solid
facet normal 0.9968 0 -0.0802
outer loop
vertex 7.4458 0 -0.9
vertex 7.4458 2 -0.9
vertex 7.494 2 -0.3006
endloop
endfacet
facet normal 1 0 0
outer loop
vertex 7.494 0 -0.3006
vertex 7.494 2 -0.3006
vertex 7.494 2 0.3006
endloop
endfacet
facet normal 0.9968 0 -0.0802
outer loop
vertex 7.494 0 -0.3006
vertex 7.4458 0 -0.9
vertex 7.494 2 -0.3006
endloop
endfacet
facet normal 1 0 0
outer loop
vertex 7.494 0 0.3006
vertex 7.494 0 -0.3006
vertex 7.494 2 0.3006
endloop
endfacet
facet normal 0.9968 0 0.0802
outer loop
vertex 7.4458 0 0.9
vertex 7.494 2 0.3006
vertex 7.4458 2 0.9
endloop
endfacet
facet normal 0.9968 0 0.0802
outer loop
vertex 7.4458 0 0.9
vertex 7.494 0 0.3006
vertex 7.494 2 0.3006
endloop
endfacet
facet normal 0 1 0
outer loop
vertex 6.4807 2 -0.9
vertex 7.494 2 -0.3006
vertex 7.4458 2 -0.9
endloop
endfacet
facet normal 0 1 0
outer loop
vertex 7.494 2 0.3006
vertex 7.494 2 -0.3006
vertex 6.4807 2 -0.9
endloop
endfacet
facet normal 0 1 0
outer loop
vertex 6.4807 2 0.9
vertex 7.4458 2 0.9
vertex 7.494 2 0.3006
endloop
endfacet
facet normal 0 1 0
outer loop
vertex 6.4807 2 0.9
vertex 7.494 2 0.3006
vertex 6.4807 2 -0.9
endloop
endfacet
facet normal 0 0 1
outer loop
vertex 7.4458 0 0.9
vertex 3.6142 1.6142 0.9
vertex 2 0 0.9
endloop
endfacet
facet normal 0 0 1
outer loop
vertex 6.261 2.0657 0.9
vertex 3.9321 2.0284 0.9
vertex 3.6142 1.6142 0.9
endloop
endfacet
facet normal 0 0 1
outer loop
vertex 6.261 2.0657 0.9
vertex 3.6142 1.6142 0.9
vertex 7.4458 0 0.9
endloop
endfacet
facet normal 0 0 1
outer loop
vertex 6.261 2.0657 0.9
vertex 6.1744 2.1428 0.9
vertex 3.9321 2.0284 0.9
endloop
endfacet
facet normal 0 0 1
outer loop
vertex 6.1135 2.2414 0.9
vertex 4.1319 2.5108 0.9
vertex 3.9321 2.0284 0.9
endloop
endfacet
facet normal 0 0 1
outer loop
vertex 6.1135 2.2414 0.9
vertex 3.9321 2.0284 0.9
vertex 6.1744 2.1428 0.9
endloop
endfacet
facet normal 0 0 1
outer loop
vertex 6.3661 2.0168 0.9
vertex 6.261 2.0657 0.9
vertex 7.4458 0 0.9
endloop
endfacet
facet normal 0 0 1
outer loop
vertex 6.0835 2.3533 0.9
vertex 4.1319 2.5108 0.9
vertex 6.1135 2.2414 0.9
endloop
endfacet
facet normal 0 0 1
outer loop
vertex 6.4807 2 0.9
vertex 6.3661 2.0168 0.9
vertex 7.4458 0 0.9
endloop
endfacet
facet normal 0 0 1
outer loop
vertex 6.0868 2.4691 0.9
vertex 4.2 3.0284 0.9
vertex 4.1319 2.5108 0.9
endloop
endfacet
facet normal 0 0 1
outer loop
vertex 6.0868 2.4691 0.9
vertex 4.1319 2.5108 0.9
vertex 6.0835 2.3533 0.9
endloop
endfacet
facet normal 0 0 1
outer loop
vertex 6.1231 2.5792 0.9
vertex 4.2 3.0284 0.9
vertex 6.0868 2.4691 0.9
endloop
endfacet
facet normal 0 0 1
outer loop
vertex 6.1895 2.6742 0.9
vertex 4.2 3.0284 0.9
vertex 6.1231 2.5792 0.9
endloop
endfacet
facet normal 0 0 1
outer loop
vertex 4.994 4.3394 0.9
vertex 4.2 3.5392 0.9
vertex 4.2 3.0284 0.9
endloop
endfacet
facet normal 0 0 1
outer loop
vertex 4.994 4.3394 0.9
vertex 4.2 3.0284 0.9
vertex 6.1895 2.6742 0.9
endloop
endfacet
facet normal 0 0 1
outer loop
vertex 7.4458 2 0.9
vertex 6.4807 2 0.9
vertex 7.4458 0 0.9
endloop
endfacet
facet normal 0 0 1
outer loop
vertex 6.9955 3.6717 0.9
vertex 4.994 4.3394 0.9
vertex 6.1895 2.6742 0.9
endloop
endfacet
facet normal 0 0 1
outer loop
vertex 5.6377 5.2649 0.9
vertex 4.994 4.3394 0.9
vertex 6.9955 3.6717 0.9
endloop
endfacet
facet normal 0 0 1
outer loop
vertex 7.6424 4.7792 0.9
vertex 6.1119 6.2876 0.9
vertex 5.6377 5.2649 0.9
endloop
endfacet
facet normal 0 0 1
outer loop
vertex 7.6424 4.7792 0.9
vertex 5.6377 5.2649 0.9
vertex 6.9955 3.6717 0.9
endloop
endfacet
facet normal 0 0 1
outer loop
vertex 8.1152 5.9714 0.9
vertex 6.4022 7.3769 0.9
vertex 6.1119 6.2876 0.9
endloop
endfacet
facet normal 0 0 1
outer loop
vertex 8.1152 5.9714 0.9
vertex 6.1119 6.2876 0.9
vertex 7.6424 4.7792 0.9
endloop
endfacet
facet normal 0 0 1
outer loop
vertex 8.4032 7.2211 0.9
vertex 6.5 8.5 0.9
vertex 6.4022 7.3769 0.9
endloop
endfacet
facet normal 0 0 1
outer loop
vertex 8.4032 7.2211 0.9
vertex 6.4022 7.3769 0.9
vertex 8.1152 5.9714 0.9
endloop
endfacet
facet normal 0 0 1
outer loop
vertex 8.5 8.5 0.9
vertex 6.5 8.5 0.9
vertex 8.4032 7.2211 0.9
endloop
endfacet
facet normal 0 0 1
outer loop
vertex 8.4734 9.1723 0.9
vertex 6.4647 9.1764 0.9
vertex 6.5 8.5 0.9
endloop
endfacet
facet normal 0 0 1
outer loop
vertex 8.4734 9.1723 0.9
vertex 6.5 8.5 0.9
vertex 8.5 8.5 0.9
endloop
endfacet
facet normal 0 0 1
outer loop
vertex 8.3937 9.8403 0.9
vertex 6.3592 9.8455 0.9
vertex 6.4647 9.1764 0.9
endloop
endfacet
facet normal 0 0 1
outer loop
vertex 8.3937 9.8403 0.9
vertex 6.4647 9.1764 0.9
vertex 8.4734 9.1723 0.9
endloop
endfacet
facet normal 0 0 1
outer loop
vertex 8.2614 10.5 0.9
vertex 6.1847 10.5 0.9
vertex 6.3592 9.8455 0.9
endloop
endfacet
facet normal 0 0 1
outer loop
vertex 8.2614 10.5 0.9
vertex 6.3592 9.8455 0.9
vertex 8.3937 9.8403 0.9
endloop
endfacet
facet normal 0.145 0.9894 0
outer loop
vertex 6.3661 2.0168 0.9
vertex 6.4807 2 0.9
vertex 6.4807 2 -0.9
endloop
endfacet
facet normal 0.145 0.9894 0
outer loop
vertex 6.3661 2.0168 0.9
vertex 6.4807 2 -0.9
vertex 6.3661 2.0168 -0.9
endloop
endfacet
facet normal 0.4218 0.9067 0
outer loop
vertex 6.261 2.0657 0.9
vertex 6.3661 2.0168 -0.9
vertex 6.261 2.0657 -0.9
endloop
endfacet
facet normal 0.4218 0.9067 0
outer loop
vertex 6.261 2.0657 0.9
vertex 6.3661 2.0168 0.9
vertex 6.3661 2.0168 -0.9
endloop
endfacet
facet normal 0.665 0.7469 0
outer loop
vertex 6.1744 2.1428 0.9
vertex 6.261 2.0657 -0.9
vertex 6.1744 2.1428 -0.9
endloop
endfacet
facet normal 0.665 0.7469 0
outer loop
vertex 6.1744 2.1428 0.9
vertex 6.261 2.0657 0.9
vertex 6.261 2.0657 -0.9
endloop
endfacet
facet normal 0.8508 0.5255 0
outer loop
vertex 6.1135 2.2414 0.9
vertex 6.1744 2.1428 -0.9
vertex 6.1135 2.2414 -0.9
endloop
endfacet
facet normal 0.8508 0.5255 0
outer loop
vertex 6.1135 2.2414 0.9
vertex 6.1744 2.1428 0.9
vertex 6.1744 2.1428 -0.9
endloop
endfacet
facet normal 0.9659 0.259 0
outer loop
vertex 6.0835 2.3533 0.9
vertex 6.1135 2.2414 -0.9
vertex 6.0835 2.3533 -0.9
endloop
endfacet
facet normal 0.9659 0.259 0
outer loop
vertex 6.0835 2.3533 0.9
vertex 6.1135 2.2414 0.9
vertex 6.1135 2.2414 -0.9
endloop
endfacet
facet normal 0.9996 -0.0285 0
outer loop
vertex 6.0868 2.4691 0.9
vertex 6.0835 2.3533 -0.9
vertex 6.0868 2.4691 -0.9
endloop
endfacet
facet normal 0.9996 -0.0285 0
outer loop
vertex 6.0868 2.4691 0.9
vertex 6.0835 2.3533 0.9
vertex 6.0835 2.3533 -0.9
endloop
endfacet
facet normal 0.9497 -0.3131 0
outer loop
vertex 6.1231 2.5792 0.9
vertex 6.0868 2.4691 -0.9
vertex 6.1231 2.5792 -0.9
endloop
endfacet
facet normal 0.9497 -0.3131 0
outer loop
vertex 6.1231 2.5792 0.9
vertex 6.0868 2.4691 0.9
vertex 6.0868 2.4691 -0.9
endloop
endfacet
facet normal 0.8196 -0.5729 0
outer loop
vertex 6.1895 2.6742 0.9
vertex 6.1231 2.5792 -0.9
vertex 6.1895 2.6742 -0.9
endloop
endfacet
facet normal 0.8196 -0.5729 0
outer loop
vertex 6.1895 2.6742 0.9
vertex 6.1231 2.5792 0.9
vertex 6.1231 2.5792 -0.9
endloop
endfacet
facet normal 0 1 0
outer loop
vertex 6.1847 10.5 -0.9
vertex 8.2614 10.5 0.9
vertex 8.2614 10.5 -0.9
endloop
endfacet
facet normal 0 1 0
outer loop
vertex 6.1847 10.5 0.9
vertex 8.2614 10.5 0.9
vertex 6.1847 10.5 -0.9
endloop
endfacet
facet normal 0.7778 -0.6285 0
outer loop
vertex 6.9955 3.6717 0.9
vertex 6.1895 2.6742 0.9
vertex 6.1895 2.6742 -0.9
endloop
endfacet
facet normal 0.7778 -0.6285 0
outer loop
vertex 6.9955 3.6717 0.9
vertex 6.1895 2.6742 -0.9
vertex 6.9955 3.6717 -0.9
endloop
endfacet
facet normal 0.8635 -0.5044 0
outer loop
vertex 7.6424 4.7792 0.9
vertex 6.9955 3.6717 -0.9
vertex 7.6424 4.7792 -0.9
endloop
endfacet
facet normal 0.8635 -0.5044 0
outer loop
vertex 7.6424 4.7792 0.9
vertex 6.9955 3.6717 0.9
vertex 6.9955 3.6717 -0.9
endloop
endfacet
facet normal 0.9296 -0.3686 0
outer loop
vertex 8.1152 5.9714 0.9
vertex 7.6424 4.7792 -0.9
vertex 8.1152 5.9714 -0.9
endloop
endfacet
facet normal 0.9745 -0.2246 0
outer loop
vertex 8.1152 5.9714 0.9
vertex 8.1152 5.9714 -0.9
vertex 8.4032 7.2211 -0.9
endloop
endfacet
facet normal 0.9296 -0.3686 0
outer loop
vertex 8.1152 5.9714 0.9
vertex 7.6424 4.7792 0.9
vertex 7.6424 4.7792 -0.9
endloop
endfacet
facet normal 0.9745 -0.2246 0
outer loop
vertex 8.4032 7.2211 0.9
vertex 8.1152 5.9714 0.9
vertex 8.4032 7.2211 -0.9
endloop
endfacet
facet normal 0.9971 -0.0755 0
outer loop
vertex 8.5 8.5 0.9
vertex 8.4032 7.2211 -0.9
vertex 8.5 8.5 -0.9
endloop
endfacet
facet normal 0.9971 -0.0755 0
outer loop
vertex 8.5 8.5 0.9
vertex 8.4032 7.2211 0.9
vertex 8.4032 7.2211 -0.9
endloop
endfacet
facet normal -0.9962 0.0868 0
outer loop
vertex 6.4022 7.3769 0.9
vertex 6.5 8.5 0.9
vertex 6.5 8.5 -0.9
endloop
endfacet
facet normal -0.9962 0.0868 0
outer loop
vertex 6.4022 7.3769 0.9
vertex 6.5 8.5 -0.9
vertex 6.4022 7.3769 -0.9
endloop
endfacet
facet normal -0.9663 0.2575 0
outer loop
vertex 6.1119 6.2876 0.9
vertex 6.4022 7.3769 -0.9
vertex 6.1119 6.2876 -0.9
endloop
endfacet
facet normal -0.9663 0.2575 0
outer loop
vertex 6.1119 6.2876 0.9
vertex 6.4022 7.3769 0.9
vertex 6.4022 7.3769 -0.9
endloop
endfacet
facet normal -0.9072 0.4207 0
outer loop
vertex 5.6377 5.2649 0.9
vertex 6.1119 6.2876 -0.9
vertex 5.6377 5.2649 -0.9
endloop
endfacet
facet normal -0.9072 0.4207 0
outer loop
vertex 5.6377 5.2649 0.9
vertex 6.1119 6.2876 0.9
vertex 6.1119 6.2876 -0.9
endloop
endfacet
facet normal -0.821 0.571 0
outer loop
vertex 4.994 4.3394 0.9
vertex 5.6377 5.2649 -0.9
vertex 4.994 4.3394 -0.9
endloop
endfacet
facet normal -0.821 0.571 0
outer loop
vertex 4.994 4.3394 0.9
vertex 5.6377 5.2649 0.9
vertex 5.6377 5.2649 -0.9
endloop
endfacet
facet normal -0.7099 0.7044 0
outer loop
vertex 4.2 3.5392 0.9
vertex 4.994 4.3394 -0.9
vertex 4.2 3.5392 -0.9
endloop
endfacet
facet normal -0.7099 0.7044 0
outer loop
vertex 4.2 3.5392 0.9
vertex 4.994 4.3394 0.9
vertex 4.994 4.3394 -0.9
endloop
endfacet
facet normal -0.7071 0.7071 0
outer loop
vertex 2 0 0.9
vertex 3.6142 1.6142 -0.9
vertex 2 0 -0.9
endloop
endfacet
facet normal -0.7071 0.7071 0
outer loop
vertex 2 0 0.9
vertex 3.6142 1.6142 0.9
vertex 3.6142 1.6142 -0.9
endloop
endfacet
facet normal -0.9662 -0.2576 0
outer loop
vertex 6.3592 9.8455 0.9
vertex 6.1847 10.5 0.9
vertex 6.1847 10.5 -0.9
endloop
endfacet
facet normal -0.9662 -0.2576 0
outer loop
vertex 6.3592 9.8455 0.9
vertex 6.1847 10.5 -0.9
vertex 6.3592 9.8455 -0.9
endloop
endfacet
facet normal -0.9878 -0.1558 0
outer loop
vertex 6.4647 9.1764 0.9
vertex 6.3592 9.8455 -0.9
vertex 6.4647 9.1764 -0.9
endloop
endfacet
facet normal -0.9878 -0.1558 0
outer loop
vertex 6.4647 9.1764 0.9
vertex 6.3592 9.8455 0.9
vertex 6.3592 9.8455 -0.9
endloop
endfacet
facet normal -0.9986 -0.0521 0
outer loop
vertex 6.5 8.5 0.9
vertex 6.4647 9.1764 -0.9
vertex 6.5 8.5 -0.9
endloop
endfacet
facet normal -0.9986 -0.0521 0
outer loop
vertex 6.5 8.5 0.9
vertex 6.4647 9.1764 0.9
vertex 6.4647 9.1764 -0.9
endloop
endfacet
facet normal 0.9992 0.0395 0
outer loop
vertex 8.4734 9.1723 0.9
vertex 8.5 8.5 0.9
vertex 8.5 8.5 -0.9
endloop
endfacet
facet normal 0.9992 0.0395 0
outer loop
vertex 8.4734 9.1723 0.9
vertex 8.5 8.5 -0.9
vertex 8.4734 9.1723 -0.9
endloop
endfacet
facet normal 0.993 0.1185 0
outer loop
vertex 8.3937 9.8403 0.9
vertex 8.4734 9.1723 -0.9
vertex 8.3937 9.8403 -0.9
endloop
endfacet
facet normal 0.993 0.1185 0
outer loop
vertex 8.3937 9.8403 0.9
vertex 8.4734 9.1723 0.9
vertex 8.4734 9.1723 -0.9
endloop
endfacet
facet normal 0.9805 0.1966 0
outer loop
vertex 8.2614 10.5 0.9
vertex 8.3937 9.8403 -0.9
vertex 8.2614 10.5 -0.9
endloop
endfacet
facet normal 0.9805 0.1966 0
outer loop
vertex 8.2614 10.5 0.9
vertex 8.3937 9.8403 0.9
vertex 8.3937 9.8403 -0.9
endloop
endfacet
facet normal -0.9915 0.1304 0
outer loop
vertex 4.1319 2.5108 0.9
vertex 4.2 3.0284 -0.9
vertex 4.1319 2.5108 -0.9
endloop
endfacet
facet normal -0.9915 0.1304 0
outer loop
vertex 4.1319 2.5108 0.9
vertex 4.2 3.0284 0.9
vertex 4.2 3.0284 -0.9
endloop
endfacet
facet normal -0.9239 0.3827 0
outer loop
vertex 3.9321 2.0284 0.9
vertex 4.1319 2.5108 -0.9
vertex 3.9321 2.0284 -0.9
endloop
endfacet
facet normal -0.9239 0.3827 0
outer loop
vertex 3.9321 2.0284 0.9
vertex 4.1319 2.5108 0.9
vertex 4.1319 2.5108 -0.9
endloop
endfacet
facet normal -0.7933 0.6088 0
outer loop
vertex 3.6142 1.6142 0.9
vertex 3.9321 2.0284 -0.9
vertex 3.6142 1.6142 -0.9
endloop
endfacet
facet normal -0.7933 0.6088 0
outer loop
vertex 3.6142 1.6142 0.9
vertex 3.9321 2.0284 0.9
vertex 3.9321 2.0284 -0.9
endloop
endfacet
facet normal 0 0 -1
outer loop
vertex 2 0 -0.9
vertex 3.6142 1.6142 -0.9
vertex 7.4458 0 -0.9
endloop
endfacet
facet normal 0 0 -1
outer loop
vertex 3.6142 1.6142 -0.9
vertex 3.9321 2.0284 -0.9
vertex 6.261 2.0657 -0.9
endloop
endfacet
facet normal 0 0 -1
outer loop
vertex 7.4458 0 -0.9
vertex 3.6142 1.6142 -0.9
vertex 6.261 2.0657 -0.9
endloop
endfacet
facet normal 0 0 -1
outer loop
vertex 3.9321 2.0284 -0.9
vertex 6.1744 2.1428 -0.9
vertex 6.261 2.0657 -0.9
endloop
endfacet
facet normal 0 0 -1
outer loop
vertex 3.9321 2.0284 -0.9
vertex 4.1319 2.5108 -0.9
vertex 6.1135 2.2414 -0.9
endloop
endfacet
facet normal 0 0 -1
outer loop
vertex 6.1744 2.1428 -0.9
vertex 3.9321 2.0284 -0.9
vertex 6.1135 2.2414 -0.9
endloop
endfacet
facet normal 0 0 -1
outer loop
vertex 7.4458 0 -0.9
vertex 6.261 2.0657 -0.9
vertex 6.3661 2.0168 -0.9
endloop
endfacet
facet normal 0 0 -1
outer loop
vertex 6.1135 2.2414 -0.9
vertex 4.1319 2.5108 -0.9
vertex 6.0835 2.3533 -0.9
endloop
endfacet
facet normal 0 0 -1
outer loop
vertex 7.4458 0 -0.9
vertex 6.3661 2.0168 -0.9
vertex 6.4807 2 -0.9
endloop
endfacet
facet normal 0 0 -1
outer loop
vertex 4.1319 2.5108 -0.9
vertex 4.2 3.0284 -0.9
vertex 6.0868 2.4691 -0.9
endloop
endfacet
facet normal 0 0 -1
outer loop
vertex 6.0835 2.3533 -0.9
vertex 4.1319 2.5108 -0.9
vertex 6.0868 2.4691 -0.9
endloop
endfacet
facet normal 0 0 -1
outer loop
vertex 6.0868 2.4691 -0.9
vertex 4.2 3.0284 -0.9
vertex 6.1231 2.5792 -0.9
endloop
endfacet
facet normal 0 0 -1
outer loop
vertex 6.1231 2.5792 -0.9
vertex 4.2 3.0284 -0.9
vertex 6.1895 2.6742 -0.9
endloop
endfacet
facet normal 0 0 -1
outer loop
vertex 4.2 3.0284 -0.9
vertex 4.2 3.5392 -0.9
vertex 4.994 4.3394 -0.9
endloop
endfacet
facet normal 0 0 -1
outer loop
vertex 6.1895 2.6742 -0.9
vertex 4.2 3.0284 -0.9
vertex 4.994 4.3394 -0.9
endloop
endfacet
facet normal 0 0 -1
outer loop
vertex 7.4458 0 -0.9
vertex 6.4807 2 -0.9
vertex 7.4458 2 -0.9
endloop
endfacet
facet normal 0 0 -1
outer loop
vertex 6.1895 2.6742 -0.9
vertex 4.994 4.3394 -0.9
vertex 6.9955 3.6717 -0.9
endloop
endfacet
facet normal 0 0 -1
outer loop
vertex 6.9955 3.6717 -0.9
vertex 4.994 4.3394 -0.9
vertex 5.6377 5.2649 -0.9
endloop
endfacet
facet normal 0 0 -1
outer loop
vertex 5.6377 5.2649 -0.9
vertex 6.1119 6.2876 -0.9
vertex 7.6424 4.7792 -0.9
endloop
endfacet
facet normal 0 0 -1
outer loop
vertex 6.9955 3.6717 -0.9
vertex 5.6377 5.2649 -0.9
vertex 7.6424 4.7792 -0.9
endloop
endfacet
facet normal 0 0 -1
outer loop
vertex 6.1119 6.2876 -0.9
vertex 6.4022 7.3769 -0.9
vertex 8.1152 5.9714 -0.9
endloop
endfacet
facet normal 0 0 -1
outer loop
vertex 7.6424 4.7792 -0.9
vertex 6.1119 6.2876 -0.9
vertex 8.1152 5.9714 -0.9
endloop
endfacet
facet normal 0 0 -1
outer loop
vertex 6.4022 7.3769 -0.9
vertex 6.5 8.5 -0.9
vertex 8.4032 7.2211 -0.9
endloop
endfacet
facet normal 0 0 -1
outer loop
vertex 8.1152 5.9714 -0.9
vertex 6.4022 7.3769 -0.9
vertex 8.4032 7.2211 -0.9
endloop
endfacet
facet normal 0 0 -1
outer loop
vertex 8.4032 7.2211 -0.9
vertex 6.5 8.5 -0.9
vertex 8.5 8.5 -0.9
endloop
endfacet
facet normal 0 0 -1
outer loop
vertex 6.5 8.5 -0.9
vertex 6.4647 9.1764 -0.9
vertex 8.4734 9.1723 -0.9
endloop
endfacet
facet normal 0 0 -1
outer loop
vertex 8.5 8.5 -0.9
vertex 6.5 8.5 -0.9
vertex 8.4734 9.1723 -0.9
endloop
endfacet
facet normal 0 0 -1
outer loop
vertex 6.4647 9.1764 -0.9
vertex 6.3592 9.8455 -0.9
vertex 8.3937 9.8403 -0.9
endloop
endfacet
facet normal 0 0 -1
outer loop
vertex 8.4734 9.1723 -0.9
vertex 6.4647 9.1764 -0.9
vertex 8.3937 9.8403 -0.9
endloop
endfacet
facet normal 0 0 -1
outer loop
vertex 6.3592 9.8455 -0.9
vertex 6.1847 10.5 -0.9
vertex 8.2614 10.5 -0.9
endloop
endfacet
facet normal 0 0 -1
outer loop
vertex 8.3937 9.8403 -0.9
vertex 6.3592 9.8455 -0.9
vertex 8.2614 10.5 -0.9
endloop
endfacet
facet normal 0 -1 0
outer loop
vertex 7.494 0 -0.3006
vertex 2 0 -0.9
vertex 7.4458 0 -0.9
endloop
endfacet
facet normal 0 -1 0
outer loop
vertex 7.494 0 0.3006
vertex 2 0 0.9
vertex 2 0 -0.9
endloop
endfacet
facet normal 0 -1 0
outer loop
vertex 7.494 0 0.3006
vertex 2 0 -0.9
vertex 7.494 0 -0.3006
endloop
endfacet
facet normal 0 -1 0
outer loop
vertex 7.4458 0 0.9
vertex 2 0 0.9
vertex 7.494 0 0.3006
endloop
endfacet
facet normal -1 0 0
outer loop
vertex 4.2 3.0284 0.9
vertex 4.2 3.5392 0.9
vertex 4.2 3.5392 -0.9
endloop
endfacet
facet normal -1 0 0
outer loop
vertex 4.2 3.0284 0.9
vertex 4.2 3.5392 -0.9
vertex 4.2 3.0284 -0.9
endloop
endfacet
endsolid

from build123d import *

# Parameters (mm, degrees)
F1_DEPTH = 0.9
F2_R     = 8
F2_R_2   = 7.5
F3_DEPTH = 2


with BuildPart() as f1:
    # F0 (on Top) → F1 (new body, symmetric)
    with BuildSketch(Plane.XY):
        with BuildLine():
            Line((2, 0), (7.5, 0))
            Line((7.5, 0), (7.5, 2))
            Line((7.5, 2), (6.480741, 2))
            ThreePointArc((6.480741, 2), (6.113547, 2.241354), (6.189471, 2.674157))
            ThreePointArc((6.189471, 2.674157), (7.901282, 5.366353), (8.5, 8.5))
            Line((8.5, 8.5), (6.5, 8.5))
            ThreePointArc((6.5, 8.5), (5.897033, 5.765955), (4.2, 3.539153))
            Line((4.2, 3.539153), (4.2, 3.028427))
            ThreePointArc((4.2, 3.028427), (4.047759, 2.26306), (3.614214, 1.614214))
            Line((3.614214, 1.614214), (2, 0))
        make_face()
        with BuildLine():
            Line((6.5, 8.5), (8.5, 8.5))
            ThreePointArc((8.5, 8.5), (8.440128, 9.507094), (8.261356, 10.5))
            Line((8.261356, 10.5), (6.184658, 10.5))
            ThreePointArc((6.184658, 10.5), (6.420681, 9.512354), (6.5, 8.5))
        make_face()
    extrude(amount=F1_DEPTH, both=True)

    # F2 (on face) → F3 (cut, through all)
    with BuildSketch(Plane.XZ):
        Circle(F2_R)
        Circle(F2_R_2, mode=Mode.SUBTRACT)
    extrude(amount=-F3_DEPTH, mode=Mode.SUBTRACT)


solid = f1.part
